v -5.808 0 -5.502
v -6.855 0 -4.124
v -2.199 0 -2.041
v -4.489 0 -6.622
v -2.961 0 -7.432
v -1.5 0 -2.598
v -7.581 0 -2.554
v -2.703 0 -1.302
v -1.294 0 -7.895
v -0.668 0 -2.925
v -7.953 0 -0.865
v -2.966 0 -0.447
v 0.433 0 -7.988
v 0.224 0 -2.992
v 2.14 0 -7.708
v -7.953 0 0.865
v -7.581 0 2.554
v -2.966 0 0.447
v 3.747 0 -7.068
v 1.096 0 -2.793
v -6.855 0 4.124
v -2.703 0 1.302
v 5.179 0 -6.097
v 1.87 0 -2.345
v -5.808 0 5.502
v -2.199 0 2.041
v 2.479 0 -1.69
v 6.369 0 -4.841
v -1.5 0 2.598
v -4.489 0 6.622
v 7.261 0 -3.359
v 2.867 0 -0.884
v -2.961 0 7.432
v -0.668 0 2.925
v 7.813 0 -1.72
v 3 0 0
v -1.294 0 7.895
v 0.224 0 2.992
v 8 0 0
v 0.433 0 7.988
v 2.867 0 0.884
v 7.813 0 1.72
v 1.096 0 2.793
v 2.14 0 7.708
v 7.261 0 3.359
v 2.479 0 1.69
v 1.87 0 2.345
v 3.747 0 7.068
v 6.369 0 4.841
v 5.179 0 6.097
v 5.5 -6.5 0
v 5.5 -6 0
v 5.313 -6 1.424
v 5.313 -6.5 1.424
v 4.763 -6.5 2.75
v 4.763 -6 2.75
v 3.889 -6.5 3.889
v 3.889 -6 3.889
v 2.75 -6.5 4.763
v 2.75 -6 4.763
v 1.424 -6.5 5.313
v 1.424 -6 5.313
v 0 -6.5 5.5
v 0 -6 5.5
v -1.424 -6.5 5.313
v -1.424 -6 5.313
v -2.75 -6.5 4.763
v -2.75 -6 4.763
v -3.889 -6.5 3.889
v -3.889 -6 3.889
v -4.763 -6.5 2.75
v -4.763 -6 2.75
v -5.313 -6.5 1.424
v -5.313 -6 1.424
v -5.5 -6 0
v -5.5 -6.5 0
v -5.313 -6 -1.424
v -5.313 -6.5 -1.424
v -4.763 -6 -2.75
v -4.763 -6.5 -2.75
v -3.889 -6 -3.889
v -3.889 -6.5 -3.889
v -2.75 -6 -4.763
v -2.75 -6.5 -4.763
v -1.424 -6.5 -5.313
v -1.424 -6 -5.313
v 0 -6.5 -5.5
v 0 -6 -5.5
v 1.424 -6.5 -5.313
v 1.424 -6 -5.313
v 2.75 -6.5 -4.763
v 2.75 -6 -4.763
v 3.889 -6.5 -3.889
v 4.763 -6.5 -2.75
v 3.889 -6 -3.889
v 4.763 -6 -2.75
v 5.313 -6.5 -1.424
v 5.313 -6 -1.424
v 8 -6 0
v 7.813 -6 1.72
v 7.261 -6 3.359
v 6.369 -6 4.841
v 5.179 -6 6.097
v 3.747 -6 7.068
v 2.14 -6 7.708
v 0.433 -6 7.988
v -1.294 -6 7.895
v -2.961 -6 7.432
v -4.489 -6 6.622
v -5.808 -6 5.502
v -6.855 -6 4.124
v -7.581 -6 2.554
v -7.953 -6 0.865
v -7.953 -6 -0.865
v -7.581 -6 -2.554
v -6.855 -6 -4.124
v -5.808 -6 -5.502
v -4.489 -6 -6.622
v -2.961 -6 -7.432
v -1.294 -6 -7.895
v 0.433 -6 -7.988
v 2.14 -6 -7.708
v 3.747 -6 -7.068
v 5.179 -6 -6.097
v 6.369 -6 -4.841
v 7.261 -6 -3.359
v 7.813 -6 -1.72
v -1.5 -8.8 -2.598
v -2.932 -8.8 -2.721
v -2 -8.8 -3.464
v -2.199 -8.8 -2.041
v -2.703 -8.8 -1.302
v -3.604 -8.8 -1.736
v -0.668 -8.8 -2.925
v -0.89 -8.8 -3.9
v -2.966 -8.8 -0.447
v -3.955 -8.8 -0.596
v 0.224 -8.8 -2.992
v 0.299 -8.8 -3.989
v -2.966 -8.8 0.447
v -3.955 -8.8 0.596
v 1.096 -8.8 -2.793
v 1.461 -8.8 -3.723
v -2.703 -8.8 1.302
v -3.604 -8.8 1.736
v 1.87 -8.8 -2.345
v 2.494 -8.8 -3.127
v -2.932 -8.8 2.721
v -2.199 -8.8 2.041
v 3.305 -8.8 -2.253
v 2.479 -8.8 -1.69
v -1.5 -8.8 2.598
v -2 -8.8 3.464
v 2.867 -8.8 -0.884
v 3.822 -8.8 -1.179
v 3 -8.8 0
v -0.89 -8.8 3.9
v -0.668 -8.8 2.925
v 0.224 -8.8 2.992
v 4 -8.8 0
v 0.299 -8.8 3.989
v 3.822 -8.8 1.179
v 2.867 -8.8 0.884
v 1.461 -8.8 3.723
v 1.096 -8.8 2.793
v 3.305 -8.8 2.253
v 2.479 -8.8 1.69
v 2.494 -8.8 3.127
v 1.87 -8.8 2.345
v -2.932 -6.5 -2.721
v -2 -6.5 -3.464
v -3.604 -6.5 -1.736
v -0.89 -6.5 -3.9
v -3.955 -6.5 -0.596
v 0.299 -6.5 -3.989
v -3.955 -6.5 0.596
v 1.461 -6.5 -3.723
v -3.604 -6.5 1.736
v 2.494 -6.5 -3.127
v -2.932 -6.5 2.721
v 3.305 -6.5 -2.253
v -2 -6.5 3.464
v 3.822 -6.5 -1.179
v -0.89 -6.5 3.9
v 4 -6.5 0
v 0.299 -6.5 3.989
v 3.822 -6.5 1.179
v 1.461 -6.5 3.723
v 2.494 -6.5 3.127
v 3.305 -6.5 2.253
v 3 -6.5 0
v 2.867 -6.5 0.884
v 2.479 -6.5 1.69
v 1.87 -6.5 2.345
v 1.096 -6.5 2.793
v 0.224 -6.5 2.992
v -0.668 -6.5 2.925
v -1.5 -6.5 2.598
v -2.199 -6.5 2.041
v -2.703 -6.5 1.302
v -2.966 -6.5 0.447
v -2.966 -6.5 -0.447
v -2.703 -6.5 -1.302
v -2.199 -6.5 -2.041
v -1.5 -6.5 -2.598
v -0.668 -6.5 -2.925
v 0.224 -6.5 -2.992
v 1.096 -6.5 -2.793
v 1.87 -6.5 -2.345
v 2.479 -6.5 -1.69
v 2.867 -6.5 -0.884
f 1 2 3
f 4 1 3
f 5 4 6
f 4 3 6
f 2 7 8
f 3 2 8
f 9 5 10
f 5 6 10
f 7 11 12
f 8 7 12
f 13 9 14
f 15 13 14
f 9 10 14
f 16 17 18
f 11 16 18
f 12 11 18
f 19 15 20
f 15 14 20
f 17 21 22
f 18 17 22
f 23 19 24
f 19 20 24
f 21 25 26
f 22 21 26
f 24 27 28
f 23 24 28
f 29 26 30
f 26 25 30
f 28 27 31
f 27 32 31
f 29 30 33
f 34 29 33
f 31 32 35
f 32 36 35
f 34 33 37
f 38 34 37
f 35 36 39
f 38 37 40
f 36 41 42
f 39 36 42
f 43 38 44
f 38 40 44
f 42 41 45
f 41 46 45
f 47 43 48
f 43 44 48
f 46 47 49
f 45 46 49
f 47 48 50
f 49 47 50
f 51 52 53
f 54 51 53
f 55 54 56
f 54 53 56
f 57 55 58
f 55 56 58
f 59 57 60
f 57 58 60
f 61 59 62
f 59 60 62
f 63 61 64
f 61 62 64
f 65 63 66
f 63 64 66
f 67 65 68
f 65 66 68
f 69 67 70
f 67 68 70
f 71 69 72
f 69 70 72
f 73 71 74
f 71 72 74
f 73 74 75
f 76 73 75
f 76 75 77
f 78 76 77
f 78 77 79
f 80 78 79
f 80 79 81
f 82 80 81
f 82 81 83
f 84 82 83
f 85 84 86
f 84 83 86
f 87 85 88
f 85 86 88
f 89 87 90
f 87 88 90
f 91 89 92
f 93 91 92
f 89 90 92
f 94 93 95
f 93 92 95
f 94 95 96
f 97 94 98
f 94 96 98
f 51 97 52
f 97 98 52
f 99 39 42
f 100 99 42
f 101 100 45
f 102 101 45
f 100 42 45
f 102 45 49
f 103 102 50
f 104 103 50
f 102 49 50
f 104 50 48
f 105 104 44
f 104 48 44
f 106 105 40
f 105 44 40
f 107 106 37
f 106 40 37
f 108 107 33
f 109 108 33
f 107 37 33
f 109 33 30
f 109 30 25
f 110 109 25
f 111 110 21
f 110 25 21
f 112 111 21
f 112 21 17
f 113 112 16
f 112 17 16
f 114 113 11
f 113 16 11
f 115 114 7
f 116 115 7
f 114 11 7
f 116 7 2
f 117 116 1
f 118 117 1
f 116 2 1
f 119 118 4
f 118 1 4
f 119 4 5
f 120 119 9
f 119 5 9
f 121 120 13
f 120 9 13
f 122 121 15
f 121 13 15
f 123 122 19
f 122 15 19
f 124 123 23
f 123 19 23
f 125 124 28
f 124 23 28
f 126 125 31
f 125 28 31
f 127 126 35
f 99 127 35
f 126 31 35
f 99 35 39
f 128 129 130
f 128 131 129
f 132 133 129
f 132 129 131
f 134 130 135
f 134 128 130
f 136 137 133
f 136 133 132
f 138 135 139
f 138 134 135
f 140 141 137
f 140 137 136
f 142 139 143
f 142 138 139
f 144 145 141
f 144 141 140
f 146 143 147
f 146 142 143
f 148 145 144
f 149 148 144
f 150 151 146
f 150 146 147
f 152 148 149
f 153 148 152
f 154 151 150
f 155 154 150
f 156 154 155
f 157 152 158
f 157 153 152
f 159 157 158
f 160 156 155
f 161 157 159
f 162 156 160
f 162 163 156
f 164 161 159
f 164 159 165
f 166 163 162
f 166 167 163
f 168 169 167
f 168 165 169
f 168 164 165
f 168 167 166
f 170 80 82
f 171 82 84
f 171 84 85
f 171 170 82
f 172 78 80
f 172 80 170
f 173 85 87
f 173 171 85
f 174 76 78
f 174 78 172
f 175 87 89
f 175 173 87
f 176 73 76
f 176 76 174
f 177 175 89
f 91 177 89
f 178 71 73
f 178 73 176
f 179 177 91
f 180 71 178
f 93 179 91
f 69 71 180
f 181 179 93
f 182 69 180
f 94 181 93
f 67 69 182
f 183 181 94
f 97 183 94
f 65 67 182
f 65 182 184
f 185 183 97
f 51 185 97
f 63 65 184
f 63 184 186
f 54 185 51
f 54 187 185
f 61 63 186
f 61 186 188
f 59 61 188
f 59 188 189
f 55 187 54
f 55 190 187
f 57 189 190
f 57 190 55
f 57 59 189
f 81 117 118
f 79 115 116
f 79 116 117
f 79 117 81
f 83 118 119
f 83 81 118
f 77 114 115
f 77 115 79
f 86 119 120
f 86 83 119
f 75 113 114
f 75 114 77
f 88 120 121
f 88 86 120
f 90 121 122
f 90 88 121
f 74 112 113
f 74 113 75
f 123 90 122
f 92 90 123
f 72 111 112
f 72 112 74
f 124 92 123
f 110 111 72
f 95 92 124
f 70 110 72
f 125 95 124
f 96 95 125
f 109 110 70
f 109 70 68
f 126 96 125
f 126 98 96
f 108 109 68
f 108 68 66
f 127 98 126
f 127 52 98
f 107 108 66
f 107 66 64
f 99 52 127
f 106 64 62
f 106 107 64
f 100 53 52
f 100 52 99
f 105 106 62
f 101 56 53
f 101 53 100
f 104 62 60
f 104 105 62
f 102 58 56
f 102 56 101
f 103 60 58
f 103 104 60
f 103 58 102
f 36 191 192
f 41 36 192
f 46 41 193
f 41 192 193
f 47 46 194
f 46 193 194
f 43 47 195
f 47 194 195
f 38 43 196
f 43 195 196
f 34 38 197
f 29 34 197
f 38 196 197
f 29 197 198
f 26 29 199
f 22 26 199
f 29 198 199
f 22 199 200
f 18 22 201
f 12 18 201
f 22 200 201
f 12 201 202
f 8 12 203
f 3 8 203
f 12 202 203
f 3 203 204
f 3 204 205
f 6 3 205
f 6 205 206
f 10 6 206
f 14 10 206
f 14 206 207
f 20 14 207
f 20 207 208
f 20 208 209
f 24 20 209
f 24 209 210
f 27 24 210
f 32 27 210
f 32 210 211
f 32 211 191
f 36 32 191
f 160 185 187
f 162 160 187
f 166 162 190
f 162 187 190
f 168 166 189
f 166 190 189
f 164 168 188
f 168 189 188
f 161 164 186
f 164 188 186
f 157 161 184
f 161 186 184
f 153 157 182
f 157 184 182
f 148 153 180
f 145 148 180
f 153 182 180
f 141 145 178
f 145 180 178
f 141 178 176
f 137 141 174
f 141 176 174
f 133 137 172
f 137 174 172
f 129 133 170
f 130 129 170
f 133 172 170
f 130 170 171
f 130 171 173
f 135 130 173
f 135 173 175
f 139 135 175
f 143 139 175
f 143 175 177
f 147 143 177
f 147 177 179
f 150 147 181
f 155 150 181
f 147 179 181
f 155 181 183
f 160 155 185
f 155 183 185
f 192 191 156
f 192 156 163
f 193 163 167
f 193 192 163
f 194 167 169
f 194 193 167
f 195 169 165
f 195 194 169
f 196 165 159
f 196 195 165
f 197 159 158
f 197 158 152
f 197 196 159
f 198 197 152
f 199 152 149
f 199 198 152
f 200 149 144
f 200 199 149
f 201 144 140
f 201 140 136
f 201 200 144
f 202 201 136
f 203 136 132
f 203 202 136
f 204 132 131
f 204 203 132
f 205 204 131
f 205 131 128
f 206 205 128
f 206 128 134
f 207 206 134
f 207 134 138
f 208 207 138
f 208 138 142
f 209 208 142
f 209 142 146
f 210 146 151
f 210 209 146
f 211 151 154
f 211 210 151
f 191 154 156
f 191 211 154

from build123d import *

# Parameters (mm, degrees)
F0_R      = 8
F1_DEPTH  = 6
F2_R      = 5.5
F3_DEPTH  = 0.5
F4_R      = 4
F4_R_2    = 3
F5_DEPTH  = 2.3
F5_FACE_R = 3
F6_DEPTH  = 6.501


with BuildPart() as f1:
    # F0 (on Front) → F1 (new body)
    with BuildSketch(Plane.XZ):
        Circle(F0_R)
    extrude(amount=F1_DEPTH)

    # F2 (on face) → F3 (join)
    with BuildSketch(Plane.XZ.offset(6)):
        Circle(F2_R)
    extrude(amount=F3_DEPTH)

    # F4 (on face) → F5 (join)
    with BuildSketch(Plane.XZ.offset(6.5)):
        Circle(F4_R)
        Circle(F4_R_2, mode=Mode.SUBTRACT)
    extrude(amount=F5_DEPTH)

    # F5_face (on face) → F6 (cut, through all)
    with BuildSketch(Plane.XZ.offset(6.5)):
        Circle(F5_FACE_R)
    extrude(amount=-F6_DEPTH, mode=Mode.SUBTRACT)


solid = f1.part
